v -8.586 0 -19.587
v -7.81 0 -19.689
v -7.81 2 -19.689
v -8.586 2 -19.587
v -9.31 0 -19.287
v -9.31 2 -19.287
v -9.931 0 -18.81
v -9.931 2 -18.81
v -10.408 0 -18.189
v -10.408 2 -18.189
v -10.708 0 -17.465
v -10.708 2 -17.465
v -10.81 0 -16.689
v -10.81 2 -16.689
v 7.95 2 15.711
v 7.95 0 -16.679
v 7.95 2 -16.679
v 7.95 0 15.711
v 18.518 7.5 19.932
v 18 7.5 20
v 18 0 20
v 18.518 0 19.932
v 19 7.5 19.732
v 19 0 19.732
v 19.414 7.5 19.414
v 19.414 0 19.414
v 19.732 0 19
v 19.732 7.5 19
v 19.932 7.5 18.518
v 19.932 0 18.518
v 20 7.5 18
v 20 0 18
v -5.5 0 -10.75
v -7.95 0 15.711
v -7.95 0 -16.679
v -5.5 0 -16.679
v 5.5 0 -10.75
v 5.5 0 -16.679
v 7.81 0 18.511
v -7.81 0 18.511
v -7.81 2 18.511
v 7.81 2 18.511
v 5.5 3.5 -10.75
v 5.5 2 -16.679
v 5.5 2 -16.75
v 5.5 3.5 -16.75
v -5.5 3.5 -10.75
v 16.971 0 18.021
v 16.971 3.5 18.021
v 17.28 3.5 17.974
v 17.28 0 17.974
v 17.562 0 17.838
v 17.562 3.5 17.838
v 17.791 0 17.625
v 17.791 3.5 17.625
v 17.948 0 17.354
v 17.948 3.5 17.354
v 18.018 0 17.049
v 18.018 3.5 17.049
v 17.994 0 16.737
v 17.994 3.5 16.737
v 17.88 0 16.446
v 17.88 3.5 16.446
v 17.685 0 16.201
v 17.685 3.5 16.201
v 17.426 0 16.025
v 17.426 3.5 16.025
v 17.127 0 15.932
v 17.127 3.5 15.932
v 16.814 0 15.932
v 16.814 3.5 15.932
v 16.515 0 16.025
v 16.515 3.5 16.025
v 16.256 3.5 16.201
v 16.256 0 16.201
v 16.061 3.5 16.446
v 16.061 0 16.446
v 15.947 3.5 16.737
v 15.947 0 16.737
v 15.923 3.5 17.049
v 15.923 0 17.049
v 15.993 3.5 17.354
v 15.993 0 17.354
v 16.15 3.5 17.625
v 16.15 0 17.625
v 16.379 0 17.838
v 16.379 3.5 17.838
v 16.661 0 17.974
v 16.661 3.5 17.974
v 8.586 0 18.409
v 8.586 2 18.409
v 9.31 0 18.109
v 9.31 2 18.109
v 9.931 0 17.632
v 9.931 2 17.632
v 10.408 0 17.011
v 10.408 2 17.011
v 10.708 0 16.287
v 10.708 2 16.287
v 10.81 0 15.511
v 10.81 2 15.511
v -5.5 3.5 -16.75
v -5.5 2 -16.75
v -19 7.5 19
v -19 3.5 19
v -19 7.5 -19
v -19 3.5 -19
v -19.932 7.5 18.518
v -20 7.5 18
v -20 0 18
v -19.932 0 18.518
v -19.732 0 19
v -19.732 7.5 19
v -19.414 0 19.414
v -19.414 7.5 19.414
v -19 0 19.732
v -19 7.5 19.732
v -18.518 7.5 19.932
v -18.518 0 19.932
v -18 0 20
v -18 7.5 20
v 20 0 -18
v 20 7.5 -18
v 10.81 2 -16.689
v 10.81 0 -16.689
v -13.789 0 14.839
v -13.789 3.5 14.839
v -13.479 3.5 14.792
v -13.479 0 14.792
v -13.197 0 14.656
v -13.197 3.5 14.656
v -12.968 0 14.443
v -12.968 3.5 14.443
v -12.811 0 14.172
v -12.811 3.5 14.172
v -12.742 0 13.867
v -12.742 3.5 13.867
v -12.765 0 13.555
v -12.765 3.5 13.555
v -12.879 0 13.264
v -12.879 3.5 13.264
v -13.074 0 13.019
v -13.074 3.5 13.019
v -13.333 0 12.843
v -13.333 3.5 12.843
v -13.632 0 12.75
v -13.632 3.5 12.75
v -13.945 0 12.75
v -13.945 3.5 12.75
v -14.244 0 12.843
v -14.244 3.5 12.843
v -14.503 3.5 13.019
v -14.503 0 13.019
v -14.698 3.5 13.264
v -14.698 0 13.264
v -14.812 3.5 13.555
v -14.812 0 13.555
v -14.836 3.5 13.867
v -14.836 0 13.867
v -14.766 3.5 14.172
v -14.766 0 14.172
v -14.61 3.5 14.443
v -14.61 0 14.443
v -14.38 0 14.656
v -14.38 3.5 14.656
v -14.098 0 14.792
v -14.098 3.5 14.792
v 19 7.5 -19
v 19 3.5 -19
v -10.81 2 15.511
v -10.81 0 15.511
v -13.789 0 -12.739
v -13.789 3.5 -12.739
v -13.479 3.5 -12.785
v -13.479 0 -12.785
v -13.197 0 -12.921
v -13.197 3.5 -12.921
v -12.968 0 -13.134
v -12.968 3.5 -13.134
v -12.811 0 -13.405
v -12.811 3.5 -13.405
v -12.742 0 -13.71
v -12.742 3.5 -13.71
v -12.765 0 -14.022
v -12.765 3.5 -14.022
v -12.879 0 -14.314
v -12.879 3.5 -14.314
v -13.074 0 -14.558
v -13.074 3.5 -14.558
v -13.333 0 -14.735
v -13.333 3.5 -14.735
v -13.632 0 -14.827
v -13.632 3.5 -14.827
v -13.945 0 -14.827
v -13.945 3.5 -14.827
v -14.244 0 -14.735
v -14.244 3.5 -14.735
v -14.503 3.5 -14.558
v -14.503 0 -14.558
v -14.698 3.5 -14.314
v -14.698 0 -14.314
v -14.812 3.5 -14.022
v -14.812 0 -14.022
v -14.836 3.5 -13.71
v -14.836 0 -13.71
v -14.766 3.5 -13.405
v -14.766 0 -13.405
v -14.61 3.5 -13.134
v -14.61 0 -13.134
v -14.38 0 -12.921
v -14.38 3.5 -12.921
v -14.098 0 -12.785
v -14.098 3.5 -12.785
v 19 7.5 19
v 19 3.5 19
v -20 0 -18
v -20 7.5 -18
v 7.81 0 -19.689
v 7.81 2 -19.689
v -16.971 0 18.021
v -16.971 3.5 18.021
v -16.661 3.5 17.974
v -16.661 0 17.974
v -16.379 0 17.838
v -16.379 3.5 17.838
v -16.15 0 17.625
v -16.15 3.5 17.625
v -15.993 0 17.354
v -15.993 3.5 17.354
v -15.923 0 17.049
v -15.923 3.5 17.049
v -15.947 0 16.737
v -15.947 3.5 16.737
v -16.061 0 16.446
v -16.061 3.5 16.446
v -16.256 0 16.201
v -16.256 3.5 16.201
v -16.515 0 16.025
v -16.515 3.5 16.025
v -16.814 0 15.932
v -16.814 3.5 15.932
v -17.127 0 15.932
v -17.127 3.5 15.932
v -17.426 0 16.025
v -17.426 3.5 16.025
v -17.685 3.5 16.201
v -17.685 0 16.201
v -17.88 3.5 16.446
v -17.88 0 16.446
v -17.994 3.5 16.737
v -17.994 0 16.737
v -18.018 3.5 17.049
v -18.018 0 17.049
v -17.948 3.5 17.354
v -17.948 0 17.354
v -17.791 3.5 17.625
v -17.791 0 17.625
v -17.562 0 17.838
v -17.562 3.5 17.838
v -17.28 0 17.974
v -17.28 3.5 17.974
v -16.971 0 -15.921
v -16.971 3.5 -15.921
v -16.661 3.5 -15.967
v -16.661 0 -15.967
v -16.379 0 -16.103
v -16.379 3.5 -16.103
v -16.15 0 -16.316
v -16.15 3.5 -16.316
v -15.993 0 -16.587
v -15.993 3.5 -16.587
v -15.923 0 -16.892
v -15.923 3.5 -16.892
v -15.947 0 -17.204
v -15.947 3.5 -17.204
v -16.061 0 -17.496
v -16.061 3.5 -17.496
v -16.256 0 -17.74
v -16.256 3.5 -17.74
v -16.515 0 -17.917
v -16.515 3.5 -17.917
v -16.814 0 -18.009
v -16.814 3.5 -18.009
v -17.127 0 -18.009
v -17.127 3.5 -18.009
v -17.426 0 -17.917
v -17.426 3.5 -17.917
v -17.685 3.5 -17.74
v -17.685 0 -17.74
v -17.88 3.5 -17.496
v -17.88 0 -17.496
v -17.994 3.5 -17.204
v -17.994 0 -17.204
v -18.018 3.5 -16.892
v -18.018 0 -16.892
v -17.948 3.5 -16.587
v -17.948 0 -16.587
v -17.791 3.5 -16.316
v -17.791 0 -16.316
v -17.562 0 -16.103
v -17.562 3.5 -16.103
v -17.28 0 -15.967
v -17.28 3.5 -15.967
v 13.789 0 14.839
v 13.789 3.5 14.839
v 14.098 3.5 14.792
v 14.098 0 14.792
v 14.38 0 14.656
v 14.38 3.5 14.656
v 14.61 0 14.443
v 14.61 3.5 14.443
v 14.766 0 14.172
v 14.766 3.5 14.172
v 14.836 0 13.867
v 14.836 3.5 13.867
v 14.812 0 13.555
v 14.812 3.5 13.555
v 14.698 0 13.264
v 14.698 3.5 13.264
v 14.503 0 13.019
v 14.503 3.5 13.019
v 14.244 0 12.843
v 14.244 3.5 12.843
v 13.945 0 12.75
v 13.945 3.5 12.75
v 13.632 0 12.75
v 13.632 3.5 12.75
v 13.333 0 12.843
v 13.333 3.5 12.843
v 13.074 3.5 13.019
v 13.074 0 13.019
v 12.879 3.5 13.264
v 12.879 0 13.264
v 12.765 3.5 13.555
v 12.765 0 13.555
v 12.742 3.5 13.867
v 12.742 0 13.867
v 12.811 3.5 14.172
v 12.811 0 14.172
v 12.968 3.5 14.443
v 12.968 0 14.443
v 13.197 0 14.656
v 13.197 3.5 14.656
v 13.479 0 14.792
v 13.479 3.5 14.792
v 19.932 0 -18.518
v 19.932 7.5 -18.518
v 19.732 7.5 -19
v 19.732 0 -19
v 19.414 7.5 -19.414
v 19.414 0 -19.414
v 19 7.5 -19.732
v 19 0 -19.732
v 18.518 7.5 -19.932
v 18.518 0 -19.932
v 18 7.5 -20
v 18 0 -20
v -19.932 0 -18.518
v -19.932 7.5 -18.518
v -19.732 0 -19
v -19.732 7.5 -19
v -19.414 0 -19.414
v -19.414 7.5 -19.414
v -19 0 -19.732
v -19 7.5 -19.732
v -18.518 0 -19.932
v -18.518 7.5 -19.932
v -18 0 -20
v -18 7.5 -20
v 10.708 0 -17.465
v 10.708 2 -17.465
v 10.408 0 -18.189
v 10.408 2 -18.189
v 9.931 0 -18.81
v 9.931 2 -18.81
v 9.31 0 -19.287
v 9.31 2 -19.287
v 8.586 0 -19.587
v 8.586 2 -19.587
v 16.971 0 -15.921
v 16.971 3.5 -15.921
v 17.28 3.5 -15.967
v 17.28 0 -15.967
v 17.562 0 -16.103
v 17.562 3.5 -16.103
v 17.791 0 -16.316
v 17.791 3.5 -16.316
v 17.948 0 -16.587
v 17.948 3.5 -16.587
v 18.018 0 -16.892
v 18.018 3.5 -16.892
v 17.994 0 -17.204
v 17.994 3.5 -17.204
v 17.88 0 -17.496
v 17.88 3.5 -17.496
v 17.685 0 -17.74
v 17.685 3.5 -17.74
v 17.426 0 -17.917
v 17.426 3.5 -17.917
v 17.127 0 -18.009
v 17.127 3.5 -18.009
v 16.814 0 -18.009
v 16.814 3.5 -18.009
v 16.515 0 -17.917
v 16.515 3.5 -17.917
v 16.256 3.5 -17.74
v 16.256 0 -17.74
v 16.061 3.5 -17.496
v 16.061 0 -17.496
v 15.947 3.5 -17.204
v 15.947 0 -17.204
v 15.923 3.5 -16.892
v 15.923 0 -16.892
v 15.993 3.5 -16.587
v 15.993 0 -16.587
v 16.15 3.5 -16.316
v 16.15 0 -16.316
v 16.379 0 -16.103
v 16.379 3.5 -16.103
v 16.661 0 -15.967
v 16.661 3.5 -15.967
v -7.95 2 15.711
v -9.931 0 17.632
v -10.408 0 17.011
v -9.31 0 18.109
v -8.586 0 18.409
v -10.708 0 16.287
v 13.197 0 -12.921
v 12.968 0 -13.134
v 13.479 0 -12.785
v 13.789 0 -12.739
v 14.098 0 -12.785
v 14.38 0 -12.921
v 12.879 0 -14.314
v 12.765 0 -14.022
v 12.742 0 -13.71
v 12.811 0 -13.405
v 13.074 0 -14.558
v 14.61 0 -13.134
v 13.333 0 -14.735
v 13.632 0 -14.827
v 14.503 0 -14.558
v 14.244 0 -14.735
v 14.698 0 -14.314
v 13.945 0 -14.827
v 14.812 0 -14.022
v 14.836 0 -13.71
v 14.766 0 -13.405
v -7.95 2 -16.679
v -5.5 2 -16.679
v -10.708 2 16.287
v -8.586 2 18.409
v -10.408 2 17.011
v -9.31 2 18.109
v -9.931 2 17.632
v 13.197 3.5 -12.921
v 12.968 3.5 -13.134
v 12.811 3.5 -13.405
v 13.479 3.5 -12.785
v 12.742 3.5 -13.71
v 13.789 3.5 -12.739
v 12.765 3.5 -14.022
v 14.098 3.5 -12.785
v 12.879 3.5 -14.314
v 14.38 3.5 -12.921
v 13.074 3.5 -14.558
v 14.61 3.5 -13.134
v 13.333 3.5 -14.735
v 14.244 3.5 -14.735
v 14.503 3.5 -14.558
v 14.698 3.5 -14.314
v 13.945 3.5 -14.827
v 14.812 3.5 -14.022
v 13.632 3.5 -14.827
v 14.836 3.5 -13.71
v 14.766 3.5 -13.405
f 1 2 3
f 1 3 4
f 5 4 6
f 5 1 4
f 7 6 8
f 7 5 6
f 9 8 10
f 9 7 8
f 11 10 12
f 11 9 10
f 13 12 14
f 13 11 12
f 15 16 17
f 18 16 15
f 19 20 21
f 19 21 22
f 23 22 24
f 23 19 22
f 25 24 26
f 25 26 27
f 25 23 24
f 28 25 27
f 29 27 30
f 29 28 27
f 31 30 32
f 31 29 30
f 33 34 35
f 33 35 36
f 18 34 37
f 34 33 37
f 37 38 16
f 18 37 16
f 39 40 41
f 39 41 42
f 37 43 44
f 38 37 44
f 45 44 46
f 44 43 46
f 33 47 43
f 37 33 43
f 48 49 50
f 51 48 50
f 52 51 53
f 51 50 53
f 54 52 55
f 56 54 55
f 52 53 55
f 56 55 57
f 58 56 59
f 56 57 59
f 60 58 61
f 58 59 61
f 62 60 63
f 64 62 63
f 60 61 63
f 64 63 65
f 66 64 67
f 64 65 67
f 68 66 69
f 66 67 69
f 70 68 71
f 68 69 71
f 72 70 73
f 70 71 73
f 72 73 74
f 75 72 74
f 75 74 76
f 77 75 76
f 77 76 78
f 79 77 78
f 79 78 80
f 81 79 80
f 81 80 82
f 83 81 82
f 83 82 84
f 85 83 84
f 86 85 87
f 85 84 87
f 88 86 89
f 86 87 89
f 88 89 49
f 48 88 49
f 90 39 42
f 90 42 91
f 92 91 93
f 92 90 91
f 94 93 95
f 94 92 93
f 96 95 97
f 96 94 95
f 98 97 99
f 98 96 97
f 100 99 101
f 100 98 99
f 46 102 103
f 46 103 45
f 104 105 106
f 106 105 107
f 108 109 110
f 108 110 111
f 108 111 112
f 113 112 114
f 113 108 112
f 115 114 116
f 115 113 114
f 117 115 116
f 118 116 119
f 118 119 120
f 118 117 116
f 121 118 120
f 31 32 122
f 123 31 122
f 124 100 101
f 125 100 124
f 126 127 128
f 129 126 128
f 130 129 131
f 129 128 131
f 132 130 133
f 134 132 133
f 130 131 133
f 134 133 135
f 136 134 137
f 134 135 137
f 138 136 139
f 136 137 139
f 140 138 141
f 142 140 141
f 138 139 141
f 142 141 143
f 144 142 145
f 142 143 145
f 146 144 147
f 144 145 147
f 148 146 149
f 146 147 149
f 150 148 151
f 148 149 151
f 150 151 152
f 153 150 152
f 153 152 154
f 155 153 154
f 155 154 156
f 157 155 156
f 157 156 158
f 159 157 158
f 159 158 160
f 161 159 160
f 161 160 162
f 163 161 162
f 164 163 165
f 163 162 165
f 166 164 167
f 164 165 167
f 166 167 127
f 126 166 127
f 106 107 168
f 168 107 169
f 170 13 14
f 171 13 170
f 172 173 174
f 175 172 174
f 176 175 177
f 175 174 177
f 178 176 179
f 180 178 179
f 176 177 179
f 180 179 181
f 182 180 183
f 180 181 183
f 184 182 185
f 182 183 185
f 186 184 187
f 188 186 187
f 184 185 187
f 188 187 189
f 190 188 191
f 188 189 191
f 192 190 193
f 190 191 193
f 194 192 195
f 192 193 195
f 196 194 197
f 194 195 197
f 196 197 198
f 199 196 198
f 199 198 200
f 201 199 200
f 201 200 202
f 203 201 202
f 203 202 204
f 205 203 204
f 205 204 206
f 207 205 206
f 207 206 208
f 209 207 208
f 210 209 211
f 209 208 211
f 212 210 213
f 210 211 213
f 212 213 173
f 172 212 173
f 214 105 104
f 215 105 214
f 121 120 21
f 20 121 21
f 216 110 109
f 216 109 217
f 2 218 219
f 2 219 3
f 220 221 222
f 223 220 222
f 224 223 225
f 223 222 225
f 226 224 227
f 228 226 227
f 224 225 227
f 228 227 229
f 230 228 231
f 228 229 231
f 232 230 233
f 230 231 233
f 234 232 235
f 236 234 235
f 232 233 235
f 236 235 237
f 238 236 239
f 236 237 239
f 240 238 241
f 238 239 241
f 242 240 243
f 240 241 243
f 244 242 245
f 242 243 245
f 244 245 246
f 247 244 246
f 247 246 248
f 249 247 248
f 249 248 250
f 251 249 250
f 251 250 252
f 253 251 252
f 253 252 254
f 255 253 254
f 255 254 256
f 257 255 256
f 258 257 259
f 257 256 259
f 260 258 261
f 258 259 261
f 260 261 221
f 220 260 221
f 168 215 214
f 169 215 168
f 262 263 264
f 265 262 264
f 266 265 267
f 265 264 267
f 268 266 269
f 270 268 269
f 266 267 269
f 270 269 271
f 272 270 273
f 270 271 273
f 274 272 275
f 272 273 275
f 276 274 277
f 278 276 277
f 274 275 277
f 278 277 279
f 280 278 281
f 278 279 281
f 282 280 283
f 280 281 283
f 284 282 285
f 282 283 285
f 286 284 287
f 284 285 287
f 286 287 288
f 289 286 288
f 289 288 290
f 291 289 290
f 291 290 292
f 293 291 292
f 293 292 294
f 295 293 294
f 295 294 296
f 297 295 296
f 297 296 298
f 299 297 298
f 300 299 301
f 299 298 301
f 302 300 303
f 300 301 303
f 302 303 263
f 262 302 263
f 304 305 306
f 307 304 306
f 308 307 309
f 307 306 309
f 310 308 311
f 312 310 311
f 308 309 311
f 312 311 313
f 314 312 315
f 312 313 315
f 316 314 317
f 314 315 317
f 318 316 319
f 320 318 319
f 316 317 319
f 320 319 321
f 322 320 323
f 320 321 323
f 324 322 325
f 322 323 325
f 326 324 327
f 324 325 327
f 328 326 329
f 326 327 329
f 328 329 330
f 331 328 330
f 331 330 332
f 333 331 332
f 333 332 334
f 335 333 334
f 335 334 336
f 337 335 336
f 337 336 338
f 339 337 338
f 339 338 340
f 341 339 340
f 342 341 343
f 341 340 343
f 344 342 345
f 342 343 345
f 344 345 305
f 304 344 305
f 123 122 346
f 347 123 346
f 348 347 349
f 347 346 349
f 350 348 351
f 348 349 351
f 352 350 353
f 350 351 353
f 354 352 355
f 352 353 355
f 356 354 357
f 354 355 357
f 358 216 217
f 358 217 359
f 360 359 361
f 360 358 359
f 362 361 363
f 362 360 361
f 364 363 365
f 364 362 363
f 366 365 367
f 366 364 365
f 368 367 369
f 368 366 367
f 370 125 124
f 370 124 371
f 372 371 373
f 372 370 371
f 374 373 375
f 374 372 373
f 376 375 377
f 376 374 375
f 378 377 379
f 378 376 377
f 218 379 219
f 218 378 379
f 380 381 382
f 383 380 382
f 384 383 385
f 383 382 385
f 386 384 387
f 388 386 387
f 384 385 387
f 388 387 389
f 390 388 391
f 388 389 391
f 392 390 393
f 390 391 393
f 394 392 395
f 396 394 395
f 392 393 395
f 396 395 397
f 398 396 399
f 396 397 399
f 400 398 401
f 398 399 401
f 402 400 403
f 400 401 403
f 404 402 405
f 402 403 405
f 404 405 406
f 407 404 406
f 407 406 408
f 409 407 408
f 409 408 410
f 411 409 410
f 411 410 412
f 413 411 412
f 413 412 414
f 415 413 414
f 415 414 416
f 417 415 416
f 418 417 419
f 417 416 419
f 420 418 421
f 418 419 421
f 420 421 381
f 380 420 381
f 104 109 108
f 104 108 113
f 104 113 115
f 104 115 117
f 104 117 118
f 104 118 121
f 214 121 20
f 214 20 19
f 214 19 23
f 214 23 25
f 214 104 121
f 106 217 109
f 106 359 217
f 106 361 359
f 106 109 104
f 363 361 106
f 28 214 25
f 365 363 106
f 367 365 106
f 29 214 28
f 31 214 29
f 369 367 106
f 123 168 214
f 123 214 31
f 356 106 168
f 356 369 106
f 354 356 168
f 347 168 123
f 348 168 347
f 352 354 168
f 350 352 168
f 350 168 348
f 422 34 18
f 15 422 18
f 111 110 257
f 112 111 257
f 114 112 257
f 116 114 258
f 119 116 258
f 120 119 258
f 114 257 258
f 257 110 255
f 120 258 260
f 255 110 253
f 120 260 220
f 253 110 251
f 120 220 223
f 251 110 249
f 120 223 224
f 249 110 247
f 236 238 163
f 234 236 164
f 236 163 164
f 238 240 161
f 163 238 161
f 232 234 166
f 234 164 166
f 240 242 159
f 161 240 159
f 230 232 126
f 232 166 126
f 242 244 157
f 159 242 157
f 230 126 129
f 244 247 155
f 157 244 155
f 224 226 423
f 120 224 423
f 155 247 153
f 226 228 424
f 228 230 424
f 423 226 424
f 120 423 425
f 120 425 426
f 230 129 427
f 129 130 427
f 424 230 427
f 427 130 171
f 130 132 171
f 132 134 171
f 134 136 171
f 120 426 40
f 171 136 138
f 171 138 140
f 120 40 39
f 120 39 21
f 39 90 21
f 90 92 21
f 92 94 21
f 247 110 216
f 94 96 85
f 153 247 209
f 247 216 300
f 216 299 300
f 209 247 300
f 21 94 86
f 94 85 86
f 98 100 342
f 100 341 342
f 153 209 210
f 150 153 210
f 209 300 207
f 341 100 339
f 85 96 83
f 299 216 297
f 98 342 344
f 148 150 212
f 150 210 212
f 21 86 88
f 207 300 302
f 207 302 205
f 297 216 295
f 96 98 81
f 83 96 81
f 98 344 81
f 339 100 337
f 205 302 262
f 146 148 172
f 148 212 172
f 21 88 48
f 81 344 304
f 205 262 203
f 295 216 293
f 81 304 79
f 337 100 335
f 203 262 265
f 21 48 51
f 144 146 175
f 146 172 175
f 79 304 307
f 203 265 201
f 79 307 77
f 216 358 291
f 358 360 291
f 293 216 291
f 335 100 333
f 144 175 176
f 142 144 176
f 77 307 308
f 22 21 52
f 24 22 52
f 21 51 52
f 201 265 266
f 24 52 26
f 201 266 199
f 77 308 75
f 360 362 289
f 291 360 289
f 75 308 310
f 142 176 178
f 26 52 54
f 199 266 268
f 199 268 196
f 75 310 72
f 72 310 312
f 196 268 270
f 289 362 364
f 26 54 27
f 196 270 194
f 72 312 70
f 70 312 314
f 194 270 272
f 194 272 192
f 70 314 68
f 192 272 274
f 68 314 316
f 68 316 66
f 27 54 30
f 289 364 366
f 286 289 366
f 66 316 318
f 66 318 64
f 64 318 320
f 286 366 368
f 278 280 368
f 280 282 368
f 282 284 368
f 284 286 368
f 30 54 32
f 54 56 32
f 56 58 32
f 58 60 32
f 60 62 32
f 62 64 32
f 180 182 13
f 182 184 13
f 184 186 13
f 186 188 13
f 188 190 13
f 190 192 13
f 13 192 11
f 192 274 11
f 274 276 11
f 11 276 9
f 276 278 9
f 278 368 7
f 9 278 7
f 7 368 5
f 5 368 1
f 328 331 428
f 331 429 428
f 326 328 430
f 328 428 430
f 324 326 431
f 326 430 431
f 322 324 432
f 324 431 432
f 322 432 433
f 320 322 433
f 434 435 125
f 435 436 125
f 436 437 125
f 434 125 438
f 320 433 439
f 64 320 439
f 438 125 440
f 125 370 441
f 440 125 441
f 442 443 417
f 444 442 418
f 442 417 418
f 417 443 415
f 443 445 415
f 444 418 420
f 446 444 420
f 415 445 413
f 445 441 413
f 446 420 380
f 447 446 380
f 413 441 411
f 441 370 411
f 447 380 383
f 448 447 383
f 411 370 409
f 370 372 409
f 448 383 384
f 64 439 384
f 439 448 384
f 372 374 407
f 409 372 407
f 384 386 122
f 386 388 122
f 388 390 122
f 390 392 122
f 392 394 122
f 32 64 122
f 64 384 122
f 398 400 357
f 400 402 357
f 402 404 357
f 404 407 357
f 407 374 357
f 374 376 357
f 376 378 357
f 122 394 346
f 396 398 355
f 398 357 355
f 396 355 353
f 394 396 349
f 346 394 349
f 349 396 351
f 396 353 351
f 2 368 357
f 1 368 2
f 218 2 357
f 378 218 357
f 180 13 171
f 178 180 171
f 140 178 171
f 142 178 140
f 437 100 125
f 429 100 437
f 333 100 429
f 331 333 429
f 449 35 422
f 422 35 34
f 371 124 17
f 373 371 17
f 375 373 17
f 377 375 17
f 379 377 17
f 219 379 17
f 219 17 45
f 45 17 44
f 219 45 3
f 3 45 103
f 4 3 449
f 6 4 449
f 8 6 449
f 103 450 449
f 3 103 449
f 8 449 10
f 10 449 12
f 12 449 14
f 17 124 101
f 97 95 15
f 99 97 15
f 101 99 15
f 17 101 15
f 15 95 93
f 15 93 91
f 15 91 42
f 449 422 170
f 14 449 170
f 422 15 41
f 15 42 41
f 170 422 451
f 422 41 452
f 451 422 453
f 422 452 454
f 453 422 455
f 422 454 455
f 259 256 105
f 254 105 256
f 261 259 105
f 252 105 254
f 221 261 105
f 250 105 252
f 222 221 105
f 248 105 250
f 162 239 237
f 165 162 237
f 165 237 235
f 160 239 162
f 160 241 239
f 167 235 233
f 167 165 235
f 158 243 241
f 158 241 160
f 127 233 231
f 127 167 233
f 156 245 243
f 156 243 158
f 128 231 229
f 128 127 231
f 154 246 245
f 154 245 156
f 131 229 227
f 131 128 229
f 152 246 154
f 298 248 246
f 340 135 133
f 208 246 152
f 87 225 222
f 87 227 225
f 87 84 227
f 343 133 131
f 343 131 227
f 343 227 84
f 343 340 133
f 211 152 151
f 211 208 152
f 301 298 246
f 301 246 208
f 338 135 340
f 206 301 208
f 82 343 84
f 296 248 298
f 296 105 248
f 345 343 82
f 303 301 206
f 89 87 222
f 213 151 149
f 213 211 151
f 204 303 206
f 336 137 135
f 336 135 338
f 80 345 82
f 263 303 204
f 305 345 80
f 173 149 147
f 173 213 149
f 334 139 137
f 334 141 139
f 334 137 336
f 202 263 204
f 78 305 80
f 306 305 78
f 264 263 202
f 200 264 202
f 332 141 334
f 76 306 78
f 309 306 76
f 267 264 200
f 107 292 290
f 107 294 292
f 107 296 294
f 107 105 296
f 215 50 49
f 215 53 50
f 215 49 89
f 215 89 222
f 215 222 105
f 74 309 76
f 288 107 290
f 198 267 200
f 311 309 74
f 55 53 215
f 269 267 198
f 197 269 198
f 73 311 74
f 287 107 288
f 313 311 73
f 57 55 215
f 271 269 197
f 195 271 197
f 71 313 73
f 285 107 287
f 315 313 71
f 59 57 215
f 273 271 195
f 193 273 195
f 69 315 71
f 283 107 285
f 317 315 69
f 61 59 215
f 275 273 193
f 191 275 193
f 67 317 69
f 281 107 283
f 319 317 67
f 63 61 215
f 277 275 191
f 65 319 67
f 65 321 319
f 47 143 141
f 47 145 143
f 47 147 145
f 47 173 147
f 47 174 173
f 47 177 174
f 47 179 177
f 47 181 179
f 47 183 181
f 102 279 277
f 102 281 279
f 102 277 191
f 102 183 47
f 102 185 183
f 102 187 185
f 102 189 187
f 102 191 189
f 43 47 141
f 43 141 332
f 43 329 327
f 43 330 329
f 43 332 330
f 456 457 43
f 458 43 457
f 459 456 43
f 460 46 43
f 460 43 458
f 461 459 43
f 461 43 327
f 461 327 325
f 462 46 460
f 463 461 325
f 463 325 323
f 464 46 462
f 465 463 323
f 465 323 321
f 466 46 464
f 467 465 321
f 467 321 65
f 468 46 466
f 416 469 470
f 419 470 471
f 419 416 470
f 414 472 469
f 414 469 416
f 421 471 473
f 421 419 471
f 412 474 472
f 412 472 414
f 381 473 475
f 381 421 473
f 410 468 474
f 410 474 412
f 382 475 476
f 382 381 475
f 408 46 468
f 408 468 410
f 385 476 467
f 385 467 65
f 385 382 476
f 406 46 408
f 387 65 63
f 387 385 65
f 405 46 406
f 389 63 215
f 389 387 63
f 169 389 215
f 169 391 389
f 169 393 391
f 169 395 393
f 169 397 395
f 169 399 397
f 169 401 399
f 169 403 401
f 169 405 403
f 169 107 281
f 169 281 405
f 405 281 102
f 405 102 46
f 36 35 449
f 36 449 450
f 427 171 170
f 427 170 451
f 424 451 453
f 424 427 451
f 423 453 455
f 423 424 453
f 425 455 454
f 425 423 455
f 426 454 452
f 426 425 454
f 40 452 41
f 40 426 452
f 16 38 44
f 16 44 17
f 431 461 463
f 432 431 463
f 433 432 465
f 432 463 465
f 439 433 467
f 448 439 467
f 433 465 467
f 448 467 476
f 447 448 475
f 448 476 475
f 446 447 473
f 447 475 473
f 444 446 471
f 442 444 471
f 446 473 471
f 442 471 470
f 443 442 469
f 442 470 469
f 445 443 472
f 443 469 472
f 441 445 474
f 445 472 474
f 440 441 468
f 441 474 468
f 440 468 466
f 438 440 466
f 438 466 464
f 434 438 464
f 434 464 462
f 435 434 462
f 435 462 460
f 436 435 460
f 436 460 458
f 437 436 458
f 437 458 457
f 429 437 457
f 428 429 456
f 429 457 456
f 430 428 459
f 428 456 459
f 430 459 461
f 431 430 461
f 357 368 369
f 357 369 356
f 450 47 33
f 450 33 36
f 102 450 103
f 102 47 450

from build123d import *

# Parameters (mm, degrees)
SKETCH1_W           = 40
SKETCH1_H           = 40
BOSS_EXTRUDE1_DEPTH = 3.5
SKETCH2_R           = 1.05
CUT_EXTRUDE1_DEPTH  = 3.5
SKETCH3_W           = 40
SKETCH3_H           = 40
SKETCH3_W_2         = 38
SKETCH3_H_2         = 38
BOSS_EXTRUDE2_DEPTH = 5
FILLET1_R           = 2
SKETCH4_W           = 11
SKETCH4_H           = 6
CUT_EXTRUDE2_DEPTH  = 5
SKETCH5_W           = 15.9
SKETCH5_H           = 32.39
CUT_EXTRUDE7_DEPTH  = 2
SKETCH7_W           = 43.568171074
SKETCH7_H           = 43.096637318
CUT_EXTRUDE9_DEPTH  = 1


with BuildPart() as part:
    # Sketch1 → Boss-Extrude1 (new body)
    with BuildSketch(Plane(origin=(0, 0, 0), x_dir=(1, 0, 0), z_dir=(0, 1, 0))):
        Rectangle(SKETCH1_W, SKETCH1_H)
    extrude(amount=BOSS_EXTRUDE1_DEPTH)

    # Sketch2 → Cut-Extrude1 (cut)
    with BuildSketch(Plane(origin=(0, 3.5, 0), x_dir=(1, 0, 0), z_dir=(0, 1, 0))):
        with Locations(Location((-16.970562748, 16.970562748, 0), (0, 0, 270))):
            Circle(SKETCH2_R)
        with Locations(Location((16.970562748, 16.970562748, 0), (0, 0, 270))):
            Circle(SKETCH2_R)
        with Locations(Location((-16.970562748, -16.970562748, 0), (0, 0, 270))):
            Circle(SKETCH2_R)
        with Locations(Location((16.970562748, -16.970562748, 0), (0, 0, 270))):
            Circle(SKETCH2_R)
        with Locations(Location((-13.788582233, 13.788582233, 0), (0, 0, 270))):
            Circle(SKETCH2_R)
        with Locations(Location((13.788582233, 13.788582233, 0), (0, 0, 270))):
            Circle(SKETCH2_R)
        with Locations(Location((13.788582233, -13.788582233, 0), (0, 0, 270))):
            Circle(SKETCH2_R)
        with Locations(Location((-13.788582233, -13.788582233, 0), (0, 0, 270))):
            Circle(SKETCH2_R)
    extrude(amount=-CUT_EXTRUDE1_DEPTH, mode=Mode.SUBTRACT)

    # Sketch3 → Boss-Extrude2 (add)
    with BuildSketch(Plane(origin=(0, 3.5, 0), x_dir=(1, 0, 0), z_dir=(0, 1, 0))):
        Rectangle(SKETCH3_W, SKETCH3_H)
        Rectangle(SKETCH3_W_2, SKETCH3_H_2, mode=Mode.SUBTRACT)
    extrude(amount=BOSS_EXTRUDE2_DEPTH)

    # Fillet1
    fillet1_edges = [part.edges().sort_by_distance(p)[0] for p in [
        (20, 4.25, 20),
        (-20, 4.25, 20),
        (-20, 4.25, -20),
        (20, 4.25, -20),
    ]]
    fillet(fillet1_edges, radius=FILLET1_R)

    # Sketch4 → Cut-Extrude2 (cut)
    with BuildSketch(Plane(origin=(0, 3.5, 0), x_dir=(1, 0, 0), z_dir=(0, 1, 0))):
        with Locations((0, 13.75)):
            Rectangle(SKETCH4_W, SKETCH4_H)
    extrude(amount=-CUT_EXTRUDE2_DEPTH, mode=Mode.SUBTRACT)

    # Sketch5 → Cut-Extrude7 (cut)
    with BuildSketch(Plane.XZ):
        with BuildLine():
            Line((-7.81, 18.511021166), (7.81, 18.511021166))
            ThreePointArc((7.81, 18.511021166), (9.931320344, 17.632341509), (10.81, 15.511021166))
            Line((10.81, 15.511021166), (10.81, -16.688978834))
            ThreePointArc((10.81, -16.688978834), (9.931320344, -18.810299178), (7.81, -19.688978834))
            Line((7.81, -19.688978834), (-7.81, -19.688978834))
            ThreePointArc((-7.81, -19.688978834), (-9.931320344, -18.810299178), (-10.81, -16.688978834))
            Line((-10.81, -16.688978834), (-10.81, 15.511021166))
            ThreePointArc((-10.81, 15.511021166), (-9.931320344, 17.632341509), (-7.81, 18.511021166))
        make_face()
        with Locations((0, -0.483978834)):
            Rectangle(SKETCH5_W, SKETCH5_H, mode=Mode.SUBTRACT)
    extrude(amount=-CUT_EXTRUDE7_DEPTH, mode=Mode.SUBTRACT)

    # Sketch7 → Cut-Extrude9 (cut)
    with BuildSketch(Plane(origin=(0, 8.5, 0), x_dir=(1, 0, 0), z_dir=(0, 1, 0))):
        Rectangle(SKETCH7_W, SKETCH7_H)
    extrude(amount=-CUT_EXTRUDE9_DEPTH, mode=Mode.SUBTRACT)


solid = part.part
